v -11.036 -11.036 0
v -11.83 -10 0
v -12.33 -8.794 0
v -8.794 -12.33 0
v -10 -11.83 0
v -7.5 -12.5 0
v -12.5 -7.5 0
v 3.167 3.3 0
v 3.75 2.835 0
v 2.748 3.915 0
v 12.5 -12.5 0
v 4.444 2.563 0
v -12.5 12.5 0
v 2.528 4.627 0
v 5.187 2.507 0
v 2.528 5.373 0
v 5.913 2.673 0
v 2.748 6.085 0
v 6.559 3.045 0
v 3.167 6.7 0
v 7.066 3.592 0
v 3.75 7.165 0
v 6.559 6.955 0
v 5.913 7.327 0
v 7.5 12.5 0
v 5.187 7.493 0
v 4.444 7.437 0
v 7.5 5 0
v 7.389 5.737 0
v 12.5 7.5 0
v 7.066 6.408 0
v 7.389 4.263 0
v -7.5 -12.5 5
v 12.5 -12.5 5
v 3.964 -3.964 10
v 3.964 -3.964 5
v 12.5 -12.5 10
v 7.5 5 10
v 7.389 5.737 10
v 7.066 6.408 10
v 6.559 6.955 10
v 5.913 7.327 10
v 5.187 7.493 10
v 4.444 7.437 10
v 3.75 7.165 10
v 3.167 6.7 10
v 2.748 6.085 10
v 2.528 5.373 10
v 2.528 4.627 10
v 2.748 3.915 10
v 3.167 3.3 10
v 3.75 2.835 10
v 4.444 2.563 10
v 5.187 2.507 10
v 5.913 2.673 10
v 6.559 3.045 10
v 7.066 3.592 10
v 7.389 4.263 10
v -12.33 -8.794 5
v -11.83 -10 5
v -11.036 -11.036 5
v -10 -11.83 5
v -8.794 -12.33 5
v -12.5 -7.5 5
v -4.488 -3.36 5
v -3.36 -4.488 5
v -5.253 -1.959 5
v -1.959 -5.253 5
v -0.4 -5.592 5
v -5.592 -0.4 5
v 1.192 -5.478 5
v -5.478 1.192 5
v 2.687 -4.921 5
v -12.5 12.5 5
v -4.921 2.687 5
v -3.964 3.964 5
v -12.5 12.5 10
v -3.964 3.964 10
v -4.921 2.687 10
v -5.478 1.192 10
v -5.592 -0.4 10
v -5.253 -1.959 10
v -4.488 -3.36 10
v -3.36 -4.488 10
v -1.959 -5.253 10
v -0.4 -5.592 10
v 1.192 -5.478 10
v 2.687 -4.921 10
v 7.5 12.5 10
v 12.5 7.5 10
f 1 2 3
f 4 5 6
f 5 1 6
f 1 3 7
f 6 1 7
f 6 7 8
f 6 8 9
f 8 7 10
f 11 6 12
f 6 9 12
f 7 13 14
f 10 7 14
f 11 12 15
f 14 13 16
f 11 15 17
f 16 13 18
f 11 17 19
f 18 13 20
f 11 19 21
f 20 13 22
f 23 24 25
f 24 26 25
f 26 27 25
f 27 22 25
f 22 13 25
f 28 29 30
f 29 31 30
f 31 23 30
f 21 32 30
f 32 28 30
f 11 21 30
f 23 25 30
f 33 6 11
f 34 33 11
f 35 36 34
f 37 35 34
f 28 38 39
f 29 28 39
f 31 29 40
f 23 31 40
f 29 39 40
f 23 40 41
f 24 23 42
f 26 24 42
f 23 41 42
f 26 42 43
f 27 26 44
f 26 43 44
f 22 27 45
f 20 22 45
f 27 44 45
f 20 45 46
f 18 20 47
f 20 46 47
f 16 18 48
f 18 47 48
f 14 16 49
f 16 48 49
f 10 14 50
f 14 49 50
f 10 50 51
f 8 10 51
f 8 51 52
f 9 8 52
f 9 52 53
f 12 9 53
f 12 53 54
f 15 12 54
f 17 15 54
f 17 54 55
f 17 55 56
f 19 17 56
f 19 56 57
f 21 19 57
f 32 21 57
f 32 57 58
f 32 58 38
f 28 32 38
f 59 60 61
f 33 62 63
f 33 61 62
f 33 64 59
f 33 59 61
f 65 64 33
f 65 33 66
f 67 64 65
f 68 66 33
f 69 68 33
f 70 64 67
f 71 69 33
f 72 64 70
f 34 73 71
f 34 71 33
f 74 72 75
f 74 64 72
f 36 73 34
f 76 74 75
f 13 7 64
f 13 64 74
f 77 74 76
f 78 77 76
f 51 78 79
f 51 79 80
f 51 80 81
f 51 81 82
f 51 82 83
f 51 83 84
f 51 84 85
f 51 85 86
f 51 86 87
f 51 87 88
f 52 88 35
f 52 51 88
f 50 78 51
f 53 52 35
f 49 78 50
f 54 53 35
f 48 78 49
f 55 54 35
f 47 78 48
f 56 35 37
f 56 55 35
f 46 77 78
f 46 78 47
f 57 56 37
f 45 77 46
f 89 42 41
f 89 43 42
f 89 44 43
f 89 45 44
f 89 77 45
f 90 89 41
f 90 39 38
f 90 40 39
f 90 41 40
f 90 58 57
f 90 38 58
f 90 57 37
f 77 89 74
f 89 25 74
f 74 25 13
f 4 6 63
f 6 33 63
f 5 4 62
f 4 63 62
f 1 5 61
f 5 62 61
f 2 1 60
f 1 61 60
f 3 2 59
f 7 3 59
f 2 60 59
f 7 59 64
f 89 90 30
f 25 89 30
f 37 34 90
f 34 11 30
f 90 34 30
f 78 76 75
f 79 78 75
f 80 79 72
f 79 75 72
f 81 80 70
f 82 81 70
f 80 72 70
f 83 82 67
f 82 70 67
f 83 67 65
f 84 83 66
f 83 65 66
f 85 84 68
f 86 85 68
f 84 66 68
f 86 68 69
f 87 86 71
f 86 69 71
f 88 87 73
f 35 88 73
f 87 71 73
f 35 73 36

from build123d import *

# Parameters (mm, degrees)
F0_W     = 25
F0_H     = 25
F1_DEPTH = 5
F3_DEPTH = 5
F4_R     = 5
F5_SIZE  = 5
F7_DEPTH = 5
F8_R     = 2.5
F9_DEPTH = 10.001


with BuildPart() as f1:
    # F0 (on Top) → F1 (new body)
    with BuildSketch(Plane.XY):
        Rectangle(F0_W, F0_H)
    extrude(amount=F1_DEPTH)

    # F2 (on face) → F3 (join)
    with BuildSketch(Plane.XY.offset(5)):
        Polygon((12.5, 12.5), (-12.5, 12.5), (12.5, -12.5), align=None)
    extrude(amount=F3_DEPTH)

    # F4
    f4_edges = [f1.edges().sort_by_distance(p)[0] for p in [
        (-12.5, -12.5, 2.5),
    ]]
    fillet(f4_edges, radius=F4_R)

    # F5
    f5_edges = [f1.edges().sort_by_distance(p)[0] for p in [
        (12.5, 12.5, 5),
    ]]
    chamfer(f5_edges, length=F5_SIZE)

    # F6 (on face) → F7 (join)
    with BuildSketch(Plane.XY.offset(5)):
        with BuildLine():
            Line((3.9644660941, -3.9644660941), (-3.9644660941, 3.9644660941))
            ThreePointArc((-3.9644660941, 3.9644660941), (-3.9644660941, -3.9644660941), (3.9644660941, -3.9644660941))
        make_face()
    extrude(amount=F7_DEPTH)

    # F8 (on face) → F9 (cut, through all)
    with BuildSketch(Plane.XY.offset(10)):
        with Locations((5, 5)):
            Circle(F8_R)
    extrude(amount=-F9_DEPTH, mode=Mode.SUBTRACT)


solid = f1.part
